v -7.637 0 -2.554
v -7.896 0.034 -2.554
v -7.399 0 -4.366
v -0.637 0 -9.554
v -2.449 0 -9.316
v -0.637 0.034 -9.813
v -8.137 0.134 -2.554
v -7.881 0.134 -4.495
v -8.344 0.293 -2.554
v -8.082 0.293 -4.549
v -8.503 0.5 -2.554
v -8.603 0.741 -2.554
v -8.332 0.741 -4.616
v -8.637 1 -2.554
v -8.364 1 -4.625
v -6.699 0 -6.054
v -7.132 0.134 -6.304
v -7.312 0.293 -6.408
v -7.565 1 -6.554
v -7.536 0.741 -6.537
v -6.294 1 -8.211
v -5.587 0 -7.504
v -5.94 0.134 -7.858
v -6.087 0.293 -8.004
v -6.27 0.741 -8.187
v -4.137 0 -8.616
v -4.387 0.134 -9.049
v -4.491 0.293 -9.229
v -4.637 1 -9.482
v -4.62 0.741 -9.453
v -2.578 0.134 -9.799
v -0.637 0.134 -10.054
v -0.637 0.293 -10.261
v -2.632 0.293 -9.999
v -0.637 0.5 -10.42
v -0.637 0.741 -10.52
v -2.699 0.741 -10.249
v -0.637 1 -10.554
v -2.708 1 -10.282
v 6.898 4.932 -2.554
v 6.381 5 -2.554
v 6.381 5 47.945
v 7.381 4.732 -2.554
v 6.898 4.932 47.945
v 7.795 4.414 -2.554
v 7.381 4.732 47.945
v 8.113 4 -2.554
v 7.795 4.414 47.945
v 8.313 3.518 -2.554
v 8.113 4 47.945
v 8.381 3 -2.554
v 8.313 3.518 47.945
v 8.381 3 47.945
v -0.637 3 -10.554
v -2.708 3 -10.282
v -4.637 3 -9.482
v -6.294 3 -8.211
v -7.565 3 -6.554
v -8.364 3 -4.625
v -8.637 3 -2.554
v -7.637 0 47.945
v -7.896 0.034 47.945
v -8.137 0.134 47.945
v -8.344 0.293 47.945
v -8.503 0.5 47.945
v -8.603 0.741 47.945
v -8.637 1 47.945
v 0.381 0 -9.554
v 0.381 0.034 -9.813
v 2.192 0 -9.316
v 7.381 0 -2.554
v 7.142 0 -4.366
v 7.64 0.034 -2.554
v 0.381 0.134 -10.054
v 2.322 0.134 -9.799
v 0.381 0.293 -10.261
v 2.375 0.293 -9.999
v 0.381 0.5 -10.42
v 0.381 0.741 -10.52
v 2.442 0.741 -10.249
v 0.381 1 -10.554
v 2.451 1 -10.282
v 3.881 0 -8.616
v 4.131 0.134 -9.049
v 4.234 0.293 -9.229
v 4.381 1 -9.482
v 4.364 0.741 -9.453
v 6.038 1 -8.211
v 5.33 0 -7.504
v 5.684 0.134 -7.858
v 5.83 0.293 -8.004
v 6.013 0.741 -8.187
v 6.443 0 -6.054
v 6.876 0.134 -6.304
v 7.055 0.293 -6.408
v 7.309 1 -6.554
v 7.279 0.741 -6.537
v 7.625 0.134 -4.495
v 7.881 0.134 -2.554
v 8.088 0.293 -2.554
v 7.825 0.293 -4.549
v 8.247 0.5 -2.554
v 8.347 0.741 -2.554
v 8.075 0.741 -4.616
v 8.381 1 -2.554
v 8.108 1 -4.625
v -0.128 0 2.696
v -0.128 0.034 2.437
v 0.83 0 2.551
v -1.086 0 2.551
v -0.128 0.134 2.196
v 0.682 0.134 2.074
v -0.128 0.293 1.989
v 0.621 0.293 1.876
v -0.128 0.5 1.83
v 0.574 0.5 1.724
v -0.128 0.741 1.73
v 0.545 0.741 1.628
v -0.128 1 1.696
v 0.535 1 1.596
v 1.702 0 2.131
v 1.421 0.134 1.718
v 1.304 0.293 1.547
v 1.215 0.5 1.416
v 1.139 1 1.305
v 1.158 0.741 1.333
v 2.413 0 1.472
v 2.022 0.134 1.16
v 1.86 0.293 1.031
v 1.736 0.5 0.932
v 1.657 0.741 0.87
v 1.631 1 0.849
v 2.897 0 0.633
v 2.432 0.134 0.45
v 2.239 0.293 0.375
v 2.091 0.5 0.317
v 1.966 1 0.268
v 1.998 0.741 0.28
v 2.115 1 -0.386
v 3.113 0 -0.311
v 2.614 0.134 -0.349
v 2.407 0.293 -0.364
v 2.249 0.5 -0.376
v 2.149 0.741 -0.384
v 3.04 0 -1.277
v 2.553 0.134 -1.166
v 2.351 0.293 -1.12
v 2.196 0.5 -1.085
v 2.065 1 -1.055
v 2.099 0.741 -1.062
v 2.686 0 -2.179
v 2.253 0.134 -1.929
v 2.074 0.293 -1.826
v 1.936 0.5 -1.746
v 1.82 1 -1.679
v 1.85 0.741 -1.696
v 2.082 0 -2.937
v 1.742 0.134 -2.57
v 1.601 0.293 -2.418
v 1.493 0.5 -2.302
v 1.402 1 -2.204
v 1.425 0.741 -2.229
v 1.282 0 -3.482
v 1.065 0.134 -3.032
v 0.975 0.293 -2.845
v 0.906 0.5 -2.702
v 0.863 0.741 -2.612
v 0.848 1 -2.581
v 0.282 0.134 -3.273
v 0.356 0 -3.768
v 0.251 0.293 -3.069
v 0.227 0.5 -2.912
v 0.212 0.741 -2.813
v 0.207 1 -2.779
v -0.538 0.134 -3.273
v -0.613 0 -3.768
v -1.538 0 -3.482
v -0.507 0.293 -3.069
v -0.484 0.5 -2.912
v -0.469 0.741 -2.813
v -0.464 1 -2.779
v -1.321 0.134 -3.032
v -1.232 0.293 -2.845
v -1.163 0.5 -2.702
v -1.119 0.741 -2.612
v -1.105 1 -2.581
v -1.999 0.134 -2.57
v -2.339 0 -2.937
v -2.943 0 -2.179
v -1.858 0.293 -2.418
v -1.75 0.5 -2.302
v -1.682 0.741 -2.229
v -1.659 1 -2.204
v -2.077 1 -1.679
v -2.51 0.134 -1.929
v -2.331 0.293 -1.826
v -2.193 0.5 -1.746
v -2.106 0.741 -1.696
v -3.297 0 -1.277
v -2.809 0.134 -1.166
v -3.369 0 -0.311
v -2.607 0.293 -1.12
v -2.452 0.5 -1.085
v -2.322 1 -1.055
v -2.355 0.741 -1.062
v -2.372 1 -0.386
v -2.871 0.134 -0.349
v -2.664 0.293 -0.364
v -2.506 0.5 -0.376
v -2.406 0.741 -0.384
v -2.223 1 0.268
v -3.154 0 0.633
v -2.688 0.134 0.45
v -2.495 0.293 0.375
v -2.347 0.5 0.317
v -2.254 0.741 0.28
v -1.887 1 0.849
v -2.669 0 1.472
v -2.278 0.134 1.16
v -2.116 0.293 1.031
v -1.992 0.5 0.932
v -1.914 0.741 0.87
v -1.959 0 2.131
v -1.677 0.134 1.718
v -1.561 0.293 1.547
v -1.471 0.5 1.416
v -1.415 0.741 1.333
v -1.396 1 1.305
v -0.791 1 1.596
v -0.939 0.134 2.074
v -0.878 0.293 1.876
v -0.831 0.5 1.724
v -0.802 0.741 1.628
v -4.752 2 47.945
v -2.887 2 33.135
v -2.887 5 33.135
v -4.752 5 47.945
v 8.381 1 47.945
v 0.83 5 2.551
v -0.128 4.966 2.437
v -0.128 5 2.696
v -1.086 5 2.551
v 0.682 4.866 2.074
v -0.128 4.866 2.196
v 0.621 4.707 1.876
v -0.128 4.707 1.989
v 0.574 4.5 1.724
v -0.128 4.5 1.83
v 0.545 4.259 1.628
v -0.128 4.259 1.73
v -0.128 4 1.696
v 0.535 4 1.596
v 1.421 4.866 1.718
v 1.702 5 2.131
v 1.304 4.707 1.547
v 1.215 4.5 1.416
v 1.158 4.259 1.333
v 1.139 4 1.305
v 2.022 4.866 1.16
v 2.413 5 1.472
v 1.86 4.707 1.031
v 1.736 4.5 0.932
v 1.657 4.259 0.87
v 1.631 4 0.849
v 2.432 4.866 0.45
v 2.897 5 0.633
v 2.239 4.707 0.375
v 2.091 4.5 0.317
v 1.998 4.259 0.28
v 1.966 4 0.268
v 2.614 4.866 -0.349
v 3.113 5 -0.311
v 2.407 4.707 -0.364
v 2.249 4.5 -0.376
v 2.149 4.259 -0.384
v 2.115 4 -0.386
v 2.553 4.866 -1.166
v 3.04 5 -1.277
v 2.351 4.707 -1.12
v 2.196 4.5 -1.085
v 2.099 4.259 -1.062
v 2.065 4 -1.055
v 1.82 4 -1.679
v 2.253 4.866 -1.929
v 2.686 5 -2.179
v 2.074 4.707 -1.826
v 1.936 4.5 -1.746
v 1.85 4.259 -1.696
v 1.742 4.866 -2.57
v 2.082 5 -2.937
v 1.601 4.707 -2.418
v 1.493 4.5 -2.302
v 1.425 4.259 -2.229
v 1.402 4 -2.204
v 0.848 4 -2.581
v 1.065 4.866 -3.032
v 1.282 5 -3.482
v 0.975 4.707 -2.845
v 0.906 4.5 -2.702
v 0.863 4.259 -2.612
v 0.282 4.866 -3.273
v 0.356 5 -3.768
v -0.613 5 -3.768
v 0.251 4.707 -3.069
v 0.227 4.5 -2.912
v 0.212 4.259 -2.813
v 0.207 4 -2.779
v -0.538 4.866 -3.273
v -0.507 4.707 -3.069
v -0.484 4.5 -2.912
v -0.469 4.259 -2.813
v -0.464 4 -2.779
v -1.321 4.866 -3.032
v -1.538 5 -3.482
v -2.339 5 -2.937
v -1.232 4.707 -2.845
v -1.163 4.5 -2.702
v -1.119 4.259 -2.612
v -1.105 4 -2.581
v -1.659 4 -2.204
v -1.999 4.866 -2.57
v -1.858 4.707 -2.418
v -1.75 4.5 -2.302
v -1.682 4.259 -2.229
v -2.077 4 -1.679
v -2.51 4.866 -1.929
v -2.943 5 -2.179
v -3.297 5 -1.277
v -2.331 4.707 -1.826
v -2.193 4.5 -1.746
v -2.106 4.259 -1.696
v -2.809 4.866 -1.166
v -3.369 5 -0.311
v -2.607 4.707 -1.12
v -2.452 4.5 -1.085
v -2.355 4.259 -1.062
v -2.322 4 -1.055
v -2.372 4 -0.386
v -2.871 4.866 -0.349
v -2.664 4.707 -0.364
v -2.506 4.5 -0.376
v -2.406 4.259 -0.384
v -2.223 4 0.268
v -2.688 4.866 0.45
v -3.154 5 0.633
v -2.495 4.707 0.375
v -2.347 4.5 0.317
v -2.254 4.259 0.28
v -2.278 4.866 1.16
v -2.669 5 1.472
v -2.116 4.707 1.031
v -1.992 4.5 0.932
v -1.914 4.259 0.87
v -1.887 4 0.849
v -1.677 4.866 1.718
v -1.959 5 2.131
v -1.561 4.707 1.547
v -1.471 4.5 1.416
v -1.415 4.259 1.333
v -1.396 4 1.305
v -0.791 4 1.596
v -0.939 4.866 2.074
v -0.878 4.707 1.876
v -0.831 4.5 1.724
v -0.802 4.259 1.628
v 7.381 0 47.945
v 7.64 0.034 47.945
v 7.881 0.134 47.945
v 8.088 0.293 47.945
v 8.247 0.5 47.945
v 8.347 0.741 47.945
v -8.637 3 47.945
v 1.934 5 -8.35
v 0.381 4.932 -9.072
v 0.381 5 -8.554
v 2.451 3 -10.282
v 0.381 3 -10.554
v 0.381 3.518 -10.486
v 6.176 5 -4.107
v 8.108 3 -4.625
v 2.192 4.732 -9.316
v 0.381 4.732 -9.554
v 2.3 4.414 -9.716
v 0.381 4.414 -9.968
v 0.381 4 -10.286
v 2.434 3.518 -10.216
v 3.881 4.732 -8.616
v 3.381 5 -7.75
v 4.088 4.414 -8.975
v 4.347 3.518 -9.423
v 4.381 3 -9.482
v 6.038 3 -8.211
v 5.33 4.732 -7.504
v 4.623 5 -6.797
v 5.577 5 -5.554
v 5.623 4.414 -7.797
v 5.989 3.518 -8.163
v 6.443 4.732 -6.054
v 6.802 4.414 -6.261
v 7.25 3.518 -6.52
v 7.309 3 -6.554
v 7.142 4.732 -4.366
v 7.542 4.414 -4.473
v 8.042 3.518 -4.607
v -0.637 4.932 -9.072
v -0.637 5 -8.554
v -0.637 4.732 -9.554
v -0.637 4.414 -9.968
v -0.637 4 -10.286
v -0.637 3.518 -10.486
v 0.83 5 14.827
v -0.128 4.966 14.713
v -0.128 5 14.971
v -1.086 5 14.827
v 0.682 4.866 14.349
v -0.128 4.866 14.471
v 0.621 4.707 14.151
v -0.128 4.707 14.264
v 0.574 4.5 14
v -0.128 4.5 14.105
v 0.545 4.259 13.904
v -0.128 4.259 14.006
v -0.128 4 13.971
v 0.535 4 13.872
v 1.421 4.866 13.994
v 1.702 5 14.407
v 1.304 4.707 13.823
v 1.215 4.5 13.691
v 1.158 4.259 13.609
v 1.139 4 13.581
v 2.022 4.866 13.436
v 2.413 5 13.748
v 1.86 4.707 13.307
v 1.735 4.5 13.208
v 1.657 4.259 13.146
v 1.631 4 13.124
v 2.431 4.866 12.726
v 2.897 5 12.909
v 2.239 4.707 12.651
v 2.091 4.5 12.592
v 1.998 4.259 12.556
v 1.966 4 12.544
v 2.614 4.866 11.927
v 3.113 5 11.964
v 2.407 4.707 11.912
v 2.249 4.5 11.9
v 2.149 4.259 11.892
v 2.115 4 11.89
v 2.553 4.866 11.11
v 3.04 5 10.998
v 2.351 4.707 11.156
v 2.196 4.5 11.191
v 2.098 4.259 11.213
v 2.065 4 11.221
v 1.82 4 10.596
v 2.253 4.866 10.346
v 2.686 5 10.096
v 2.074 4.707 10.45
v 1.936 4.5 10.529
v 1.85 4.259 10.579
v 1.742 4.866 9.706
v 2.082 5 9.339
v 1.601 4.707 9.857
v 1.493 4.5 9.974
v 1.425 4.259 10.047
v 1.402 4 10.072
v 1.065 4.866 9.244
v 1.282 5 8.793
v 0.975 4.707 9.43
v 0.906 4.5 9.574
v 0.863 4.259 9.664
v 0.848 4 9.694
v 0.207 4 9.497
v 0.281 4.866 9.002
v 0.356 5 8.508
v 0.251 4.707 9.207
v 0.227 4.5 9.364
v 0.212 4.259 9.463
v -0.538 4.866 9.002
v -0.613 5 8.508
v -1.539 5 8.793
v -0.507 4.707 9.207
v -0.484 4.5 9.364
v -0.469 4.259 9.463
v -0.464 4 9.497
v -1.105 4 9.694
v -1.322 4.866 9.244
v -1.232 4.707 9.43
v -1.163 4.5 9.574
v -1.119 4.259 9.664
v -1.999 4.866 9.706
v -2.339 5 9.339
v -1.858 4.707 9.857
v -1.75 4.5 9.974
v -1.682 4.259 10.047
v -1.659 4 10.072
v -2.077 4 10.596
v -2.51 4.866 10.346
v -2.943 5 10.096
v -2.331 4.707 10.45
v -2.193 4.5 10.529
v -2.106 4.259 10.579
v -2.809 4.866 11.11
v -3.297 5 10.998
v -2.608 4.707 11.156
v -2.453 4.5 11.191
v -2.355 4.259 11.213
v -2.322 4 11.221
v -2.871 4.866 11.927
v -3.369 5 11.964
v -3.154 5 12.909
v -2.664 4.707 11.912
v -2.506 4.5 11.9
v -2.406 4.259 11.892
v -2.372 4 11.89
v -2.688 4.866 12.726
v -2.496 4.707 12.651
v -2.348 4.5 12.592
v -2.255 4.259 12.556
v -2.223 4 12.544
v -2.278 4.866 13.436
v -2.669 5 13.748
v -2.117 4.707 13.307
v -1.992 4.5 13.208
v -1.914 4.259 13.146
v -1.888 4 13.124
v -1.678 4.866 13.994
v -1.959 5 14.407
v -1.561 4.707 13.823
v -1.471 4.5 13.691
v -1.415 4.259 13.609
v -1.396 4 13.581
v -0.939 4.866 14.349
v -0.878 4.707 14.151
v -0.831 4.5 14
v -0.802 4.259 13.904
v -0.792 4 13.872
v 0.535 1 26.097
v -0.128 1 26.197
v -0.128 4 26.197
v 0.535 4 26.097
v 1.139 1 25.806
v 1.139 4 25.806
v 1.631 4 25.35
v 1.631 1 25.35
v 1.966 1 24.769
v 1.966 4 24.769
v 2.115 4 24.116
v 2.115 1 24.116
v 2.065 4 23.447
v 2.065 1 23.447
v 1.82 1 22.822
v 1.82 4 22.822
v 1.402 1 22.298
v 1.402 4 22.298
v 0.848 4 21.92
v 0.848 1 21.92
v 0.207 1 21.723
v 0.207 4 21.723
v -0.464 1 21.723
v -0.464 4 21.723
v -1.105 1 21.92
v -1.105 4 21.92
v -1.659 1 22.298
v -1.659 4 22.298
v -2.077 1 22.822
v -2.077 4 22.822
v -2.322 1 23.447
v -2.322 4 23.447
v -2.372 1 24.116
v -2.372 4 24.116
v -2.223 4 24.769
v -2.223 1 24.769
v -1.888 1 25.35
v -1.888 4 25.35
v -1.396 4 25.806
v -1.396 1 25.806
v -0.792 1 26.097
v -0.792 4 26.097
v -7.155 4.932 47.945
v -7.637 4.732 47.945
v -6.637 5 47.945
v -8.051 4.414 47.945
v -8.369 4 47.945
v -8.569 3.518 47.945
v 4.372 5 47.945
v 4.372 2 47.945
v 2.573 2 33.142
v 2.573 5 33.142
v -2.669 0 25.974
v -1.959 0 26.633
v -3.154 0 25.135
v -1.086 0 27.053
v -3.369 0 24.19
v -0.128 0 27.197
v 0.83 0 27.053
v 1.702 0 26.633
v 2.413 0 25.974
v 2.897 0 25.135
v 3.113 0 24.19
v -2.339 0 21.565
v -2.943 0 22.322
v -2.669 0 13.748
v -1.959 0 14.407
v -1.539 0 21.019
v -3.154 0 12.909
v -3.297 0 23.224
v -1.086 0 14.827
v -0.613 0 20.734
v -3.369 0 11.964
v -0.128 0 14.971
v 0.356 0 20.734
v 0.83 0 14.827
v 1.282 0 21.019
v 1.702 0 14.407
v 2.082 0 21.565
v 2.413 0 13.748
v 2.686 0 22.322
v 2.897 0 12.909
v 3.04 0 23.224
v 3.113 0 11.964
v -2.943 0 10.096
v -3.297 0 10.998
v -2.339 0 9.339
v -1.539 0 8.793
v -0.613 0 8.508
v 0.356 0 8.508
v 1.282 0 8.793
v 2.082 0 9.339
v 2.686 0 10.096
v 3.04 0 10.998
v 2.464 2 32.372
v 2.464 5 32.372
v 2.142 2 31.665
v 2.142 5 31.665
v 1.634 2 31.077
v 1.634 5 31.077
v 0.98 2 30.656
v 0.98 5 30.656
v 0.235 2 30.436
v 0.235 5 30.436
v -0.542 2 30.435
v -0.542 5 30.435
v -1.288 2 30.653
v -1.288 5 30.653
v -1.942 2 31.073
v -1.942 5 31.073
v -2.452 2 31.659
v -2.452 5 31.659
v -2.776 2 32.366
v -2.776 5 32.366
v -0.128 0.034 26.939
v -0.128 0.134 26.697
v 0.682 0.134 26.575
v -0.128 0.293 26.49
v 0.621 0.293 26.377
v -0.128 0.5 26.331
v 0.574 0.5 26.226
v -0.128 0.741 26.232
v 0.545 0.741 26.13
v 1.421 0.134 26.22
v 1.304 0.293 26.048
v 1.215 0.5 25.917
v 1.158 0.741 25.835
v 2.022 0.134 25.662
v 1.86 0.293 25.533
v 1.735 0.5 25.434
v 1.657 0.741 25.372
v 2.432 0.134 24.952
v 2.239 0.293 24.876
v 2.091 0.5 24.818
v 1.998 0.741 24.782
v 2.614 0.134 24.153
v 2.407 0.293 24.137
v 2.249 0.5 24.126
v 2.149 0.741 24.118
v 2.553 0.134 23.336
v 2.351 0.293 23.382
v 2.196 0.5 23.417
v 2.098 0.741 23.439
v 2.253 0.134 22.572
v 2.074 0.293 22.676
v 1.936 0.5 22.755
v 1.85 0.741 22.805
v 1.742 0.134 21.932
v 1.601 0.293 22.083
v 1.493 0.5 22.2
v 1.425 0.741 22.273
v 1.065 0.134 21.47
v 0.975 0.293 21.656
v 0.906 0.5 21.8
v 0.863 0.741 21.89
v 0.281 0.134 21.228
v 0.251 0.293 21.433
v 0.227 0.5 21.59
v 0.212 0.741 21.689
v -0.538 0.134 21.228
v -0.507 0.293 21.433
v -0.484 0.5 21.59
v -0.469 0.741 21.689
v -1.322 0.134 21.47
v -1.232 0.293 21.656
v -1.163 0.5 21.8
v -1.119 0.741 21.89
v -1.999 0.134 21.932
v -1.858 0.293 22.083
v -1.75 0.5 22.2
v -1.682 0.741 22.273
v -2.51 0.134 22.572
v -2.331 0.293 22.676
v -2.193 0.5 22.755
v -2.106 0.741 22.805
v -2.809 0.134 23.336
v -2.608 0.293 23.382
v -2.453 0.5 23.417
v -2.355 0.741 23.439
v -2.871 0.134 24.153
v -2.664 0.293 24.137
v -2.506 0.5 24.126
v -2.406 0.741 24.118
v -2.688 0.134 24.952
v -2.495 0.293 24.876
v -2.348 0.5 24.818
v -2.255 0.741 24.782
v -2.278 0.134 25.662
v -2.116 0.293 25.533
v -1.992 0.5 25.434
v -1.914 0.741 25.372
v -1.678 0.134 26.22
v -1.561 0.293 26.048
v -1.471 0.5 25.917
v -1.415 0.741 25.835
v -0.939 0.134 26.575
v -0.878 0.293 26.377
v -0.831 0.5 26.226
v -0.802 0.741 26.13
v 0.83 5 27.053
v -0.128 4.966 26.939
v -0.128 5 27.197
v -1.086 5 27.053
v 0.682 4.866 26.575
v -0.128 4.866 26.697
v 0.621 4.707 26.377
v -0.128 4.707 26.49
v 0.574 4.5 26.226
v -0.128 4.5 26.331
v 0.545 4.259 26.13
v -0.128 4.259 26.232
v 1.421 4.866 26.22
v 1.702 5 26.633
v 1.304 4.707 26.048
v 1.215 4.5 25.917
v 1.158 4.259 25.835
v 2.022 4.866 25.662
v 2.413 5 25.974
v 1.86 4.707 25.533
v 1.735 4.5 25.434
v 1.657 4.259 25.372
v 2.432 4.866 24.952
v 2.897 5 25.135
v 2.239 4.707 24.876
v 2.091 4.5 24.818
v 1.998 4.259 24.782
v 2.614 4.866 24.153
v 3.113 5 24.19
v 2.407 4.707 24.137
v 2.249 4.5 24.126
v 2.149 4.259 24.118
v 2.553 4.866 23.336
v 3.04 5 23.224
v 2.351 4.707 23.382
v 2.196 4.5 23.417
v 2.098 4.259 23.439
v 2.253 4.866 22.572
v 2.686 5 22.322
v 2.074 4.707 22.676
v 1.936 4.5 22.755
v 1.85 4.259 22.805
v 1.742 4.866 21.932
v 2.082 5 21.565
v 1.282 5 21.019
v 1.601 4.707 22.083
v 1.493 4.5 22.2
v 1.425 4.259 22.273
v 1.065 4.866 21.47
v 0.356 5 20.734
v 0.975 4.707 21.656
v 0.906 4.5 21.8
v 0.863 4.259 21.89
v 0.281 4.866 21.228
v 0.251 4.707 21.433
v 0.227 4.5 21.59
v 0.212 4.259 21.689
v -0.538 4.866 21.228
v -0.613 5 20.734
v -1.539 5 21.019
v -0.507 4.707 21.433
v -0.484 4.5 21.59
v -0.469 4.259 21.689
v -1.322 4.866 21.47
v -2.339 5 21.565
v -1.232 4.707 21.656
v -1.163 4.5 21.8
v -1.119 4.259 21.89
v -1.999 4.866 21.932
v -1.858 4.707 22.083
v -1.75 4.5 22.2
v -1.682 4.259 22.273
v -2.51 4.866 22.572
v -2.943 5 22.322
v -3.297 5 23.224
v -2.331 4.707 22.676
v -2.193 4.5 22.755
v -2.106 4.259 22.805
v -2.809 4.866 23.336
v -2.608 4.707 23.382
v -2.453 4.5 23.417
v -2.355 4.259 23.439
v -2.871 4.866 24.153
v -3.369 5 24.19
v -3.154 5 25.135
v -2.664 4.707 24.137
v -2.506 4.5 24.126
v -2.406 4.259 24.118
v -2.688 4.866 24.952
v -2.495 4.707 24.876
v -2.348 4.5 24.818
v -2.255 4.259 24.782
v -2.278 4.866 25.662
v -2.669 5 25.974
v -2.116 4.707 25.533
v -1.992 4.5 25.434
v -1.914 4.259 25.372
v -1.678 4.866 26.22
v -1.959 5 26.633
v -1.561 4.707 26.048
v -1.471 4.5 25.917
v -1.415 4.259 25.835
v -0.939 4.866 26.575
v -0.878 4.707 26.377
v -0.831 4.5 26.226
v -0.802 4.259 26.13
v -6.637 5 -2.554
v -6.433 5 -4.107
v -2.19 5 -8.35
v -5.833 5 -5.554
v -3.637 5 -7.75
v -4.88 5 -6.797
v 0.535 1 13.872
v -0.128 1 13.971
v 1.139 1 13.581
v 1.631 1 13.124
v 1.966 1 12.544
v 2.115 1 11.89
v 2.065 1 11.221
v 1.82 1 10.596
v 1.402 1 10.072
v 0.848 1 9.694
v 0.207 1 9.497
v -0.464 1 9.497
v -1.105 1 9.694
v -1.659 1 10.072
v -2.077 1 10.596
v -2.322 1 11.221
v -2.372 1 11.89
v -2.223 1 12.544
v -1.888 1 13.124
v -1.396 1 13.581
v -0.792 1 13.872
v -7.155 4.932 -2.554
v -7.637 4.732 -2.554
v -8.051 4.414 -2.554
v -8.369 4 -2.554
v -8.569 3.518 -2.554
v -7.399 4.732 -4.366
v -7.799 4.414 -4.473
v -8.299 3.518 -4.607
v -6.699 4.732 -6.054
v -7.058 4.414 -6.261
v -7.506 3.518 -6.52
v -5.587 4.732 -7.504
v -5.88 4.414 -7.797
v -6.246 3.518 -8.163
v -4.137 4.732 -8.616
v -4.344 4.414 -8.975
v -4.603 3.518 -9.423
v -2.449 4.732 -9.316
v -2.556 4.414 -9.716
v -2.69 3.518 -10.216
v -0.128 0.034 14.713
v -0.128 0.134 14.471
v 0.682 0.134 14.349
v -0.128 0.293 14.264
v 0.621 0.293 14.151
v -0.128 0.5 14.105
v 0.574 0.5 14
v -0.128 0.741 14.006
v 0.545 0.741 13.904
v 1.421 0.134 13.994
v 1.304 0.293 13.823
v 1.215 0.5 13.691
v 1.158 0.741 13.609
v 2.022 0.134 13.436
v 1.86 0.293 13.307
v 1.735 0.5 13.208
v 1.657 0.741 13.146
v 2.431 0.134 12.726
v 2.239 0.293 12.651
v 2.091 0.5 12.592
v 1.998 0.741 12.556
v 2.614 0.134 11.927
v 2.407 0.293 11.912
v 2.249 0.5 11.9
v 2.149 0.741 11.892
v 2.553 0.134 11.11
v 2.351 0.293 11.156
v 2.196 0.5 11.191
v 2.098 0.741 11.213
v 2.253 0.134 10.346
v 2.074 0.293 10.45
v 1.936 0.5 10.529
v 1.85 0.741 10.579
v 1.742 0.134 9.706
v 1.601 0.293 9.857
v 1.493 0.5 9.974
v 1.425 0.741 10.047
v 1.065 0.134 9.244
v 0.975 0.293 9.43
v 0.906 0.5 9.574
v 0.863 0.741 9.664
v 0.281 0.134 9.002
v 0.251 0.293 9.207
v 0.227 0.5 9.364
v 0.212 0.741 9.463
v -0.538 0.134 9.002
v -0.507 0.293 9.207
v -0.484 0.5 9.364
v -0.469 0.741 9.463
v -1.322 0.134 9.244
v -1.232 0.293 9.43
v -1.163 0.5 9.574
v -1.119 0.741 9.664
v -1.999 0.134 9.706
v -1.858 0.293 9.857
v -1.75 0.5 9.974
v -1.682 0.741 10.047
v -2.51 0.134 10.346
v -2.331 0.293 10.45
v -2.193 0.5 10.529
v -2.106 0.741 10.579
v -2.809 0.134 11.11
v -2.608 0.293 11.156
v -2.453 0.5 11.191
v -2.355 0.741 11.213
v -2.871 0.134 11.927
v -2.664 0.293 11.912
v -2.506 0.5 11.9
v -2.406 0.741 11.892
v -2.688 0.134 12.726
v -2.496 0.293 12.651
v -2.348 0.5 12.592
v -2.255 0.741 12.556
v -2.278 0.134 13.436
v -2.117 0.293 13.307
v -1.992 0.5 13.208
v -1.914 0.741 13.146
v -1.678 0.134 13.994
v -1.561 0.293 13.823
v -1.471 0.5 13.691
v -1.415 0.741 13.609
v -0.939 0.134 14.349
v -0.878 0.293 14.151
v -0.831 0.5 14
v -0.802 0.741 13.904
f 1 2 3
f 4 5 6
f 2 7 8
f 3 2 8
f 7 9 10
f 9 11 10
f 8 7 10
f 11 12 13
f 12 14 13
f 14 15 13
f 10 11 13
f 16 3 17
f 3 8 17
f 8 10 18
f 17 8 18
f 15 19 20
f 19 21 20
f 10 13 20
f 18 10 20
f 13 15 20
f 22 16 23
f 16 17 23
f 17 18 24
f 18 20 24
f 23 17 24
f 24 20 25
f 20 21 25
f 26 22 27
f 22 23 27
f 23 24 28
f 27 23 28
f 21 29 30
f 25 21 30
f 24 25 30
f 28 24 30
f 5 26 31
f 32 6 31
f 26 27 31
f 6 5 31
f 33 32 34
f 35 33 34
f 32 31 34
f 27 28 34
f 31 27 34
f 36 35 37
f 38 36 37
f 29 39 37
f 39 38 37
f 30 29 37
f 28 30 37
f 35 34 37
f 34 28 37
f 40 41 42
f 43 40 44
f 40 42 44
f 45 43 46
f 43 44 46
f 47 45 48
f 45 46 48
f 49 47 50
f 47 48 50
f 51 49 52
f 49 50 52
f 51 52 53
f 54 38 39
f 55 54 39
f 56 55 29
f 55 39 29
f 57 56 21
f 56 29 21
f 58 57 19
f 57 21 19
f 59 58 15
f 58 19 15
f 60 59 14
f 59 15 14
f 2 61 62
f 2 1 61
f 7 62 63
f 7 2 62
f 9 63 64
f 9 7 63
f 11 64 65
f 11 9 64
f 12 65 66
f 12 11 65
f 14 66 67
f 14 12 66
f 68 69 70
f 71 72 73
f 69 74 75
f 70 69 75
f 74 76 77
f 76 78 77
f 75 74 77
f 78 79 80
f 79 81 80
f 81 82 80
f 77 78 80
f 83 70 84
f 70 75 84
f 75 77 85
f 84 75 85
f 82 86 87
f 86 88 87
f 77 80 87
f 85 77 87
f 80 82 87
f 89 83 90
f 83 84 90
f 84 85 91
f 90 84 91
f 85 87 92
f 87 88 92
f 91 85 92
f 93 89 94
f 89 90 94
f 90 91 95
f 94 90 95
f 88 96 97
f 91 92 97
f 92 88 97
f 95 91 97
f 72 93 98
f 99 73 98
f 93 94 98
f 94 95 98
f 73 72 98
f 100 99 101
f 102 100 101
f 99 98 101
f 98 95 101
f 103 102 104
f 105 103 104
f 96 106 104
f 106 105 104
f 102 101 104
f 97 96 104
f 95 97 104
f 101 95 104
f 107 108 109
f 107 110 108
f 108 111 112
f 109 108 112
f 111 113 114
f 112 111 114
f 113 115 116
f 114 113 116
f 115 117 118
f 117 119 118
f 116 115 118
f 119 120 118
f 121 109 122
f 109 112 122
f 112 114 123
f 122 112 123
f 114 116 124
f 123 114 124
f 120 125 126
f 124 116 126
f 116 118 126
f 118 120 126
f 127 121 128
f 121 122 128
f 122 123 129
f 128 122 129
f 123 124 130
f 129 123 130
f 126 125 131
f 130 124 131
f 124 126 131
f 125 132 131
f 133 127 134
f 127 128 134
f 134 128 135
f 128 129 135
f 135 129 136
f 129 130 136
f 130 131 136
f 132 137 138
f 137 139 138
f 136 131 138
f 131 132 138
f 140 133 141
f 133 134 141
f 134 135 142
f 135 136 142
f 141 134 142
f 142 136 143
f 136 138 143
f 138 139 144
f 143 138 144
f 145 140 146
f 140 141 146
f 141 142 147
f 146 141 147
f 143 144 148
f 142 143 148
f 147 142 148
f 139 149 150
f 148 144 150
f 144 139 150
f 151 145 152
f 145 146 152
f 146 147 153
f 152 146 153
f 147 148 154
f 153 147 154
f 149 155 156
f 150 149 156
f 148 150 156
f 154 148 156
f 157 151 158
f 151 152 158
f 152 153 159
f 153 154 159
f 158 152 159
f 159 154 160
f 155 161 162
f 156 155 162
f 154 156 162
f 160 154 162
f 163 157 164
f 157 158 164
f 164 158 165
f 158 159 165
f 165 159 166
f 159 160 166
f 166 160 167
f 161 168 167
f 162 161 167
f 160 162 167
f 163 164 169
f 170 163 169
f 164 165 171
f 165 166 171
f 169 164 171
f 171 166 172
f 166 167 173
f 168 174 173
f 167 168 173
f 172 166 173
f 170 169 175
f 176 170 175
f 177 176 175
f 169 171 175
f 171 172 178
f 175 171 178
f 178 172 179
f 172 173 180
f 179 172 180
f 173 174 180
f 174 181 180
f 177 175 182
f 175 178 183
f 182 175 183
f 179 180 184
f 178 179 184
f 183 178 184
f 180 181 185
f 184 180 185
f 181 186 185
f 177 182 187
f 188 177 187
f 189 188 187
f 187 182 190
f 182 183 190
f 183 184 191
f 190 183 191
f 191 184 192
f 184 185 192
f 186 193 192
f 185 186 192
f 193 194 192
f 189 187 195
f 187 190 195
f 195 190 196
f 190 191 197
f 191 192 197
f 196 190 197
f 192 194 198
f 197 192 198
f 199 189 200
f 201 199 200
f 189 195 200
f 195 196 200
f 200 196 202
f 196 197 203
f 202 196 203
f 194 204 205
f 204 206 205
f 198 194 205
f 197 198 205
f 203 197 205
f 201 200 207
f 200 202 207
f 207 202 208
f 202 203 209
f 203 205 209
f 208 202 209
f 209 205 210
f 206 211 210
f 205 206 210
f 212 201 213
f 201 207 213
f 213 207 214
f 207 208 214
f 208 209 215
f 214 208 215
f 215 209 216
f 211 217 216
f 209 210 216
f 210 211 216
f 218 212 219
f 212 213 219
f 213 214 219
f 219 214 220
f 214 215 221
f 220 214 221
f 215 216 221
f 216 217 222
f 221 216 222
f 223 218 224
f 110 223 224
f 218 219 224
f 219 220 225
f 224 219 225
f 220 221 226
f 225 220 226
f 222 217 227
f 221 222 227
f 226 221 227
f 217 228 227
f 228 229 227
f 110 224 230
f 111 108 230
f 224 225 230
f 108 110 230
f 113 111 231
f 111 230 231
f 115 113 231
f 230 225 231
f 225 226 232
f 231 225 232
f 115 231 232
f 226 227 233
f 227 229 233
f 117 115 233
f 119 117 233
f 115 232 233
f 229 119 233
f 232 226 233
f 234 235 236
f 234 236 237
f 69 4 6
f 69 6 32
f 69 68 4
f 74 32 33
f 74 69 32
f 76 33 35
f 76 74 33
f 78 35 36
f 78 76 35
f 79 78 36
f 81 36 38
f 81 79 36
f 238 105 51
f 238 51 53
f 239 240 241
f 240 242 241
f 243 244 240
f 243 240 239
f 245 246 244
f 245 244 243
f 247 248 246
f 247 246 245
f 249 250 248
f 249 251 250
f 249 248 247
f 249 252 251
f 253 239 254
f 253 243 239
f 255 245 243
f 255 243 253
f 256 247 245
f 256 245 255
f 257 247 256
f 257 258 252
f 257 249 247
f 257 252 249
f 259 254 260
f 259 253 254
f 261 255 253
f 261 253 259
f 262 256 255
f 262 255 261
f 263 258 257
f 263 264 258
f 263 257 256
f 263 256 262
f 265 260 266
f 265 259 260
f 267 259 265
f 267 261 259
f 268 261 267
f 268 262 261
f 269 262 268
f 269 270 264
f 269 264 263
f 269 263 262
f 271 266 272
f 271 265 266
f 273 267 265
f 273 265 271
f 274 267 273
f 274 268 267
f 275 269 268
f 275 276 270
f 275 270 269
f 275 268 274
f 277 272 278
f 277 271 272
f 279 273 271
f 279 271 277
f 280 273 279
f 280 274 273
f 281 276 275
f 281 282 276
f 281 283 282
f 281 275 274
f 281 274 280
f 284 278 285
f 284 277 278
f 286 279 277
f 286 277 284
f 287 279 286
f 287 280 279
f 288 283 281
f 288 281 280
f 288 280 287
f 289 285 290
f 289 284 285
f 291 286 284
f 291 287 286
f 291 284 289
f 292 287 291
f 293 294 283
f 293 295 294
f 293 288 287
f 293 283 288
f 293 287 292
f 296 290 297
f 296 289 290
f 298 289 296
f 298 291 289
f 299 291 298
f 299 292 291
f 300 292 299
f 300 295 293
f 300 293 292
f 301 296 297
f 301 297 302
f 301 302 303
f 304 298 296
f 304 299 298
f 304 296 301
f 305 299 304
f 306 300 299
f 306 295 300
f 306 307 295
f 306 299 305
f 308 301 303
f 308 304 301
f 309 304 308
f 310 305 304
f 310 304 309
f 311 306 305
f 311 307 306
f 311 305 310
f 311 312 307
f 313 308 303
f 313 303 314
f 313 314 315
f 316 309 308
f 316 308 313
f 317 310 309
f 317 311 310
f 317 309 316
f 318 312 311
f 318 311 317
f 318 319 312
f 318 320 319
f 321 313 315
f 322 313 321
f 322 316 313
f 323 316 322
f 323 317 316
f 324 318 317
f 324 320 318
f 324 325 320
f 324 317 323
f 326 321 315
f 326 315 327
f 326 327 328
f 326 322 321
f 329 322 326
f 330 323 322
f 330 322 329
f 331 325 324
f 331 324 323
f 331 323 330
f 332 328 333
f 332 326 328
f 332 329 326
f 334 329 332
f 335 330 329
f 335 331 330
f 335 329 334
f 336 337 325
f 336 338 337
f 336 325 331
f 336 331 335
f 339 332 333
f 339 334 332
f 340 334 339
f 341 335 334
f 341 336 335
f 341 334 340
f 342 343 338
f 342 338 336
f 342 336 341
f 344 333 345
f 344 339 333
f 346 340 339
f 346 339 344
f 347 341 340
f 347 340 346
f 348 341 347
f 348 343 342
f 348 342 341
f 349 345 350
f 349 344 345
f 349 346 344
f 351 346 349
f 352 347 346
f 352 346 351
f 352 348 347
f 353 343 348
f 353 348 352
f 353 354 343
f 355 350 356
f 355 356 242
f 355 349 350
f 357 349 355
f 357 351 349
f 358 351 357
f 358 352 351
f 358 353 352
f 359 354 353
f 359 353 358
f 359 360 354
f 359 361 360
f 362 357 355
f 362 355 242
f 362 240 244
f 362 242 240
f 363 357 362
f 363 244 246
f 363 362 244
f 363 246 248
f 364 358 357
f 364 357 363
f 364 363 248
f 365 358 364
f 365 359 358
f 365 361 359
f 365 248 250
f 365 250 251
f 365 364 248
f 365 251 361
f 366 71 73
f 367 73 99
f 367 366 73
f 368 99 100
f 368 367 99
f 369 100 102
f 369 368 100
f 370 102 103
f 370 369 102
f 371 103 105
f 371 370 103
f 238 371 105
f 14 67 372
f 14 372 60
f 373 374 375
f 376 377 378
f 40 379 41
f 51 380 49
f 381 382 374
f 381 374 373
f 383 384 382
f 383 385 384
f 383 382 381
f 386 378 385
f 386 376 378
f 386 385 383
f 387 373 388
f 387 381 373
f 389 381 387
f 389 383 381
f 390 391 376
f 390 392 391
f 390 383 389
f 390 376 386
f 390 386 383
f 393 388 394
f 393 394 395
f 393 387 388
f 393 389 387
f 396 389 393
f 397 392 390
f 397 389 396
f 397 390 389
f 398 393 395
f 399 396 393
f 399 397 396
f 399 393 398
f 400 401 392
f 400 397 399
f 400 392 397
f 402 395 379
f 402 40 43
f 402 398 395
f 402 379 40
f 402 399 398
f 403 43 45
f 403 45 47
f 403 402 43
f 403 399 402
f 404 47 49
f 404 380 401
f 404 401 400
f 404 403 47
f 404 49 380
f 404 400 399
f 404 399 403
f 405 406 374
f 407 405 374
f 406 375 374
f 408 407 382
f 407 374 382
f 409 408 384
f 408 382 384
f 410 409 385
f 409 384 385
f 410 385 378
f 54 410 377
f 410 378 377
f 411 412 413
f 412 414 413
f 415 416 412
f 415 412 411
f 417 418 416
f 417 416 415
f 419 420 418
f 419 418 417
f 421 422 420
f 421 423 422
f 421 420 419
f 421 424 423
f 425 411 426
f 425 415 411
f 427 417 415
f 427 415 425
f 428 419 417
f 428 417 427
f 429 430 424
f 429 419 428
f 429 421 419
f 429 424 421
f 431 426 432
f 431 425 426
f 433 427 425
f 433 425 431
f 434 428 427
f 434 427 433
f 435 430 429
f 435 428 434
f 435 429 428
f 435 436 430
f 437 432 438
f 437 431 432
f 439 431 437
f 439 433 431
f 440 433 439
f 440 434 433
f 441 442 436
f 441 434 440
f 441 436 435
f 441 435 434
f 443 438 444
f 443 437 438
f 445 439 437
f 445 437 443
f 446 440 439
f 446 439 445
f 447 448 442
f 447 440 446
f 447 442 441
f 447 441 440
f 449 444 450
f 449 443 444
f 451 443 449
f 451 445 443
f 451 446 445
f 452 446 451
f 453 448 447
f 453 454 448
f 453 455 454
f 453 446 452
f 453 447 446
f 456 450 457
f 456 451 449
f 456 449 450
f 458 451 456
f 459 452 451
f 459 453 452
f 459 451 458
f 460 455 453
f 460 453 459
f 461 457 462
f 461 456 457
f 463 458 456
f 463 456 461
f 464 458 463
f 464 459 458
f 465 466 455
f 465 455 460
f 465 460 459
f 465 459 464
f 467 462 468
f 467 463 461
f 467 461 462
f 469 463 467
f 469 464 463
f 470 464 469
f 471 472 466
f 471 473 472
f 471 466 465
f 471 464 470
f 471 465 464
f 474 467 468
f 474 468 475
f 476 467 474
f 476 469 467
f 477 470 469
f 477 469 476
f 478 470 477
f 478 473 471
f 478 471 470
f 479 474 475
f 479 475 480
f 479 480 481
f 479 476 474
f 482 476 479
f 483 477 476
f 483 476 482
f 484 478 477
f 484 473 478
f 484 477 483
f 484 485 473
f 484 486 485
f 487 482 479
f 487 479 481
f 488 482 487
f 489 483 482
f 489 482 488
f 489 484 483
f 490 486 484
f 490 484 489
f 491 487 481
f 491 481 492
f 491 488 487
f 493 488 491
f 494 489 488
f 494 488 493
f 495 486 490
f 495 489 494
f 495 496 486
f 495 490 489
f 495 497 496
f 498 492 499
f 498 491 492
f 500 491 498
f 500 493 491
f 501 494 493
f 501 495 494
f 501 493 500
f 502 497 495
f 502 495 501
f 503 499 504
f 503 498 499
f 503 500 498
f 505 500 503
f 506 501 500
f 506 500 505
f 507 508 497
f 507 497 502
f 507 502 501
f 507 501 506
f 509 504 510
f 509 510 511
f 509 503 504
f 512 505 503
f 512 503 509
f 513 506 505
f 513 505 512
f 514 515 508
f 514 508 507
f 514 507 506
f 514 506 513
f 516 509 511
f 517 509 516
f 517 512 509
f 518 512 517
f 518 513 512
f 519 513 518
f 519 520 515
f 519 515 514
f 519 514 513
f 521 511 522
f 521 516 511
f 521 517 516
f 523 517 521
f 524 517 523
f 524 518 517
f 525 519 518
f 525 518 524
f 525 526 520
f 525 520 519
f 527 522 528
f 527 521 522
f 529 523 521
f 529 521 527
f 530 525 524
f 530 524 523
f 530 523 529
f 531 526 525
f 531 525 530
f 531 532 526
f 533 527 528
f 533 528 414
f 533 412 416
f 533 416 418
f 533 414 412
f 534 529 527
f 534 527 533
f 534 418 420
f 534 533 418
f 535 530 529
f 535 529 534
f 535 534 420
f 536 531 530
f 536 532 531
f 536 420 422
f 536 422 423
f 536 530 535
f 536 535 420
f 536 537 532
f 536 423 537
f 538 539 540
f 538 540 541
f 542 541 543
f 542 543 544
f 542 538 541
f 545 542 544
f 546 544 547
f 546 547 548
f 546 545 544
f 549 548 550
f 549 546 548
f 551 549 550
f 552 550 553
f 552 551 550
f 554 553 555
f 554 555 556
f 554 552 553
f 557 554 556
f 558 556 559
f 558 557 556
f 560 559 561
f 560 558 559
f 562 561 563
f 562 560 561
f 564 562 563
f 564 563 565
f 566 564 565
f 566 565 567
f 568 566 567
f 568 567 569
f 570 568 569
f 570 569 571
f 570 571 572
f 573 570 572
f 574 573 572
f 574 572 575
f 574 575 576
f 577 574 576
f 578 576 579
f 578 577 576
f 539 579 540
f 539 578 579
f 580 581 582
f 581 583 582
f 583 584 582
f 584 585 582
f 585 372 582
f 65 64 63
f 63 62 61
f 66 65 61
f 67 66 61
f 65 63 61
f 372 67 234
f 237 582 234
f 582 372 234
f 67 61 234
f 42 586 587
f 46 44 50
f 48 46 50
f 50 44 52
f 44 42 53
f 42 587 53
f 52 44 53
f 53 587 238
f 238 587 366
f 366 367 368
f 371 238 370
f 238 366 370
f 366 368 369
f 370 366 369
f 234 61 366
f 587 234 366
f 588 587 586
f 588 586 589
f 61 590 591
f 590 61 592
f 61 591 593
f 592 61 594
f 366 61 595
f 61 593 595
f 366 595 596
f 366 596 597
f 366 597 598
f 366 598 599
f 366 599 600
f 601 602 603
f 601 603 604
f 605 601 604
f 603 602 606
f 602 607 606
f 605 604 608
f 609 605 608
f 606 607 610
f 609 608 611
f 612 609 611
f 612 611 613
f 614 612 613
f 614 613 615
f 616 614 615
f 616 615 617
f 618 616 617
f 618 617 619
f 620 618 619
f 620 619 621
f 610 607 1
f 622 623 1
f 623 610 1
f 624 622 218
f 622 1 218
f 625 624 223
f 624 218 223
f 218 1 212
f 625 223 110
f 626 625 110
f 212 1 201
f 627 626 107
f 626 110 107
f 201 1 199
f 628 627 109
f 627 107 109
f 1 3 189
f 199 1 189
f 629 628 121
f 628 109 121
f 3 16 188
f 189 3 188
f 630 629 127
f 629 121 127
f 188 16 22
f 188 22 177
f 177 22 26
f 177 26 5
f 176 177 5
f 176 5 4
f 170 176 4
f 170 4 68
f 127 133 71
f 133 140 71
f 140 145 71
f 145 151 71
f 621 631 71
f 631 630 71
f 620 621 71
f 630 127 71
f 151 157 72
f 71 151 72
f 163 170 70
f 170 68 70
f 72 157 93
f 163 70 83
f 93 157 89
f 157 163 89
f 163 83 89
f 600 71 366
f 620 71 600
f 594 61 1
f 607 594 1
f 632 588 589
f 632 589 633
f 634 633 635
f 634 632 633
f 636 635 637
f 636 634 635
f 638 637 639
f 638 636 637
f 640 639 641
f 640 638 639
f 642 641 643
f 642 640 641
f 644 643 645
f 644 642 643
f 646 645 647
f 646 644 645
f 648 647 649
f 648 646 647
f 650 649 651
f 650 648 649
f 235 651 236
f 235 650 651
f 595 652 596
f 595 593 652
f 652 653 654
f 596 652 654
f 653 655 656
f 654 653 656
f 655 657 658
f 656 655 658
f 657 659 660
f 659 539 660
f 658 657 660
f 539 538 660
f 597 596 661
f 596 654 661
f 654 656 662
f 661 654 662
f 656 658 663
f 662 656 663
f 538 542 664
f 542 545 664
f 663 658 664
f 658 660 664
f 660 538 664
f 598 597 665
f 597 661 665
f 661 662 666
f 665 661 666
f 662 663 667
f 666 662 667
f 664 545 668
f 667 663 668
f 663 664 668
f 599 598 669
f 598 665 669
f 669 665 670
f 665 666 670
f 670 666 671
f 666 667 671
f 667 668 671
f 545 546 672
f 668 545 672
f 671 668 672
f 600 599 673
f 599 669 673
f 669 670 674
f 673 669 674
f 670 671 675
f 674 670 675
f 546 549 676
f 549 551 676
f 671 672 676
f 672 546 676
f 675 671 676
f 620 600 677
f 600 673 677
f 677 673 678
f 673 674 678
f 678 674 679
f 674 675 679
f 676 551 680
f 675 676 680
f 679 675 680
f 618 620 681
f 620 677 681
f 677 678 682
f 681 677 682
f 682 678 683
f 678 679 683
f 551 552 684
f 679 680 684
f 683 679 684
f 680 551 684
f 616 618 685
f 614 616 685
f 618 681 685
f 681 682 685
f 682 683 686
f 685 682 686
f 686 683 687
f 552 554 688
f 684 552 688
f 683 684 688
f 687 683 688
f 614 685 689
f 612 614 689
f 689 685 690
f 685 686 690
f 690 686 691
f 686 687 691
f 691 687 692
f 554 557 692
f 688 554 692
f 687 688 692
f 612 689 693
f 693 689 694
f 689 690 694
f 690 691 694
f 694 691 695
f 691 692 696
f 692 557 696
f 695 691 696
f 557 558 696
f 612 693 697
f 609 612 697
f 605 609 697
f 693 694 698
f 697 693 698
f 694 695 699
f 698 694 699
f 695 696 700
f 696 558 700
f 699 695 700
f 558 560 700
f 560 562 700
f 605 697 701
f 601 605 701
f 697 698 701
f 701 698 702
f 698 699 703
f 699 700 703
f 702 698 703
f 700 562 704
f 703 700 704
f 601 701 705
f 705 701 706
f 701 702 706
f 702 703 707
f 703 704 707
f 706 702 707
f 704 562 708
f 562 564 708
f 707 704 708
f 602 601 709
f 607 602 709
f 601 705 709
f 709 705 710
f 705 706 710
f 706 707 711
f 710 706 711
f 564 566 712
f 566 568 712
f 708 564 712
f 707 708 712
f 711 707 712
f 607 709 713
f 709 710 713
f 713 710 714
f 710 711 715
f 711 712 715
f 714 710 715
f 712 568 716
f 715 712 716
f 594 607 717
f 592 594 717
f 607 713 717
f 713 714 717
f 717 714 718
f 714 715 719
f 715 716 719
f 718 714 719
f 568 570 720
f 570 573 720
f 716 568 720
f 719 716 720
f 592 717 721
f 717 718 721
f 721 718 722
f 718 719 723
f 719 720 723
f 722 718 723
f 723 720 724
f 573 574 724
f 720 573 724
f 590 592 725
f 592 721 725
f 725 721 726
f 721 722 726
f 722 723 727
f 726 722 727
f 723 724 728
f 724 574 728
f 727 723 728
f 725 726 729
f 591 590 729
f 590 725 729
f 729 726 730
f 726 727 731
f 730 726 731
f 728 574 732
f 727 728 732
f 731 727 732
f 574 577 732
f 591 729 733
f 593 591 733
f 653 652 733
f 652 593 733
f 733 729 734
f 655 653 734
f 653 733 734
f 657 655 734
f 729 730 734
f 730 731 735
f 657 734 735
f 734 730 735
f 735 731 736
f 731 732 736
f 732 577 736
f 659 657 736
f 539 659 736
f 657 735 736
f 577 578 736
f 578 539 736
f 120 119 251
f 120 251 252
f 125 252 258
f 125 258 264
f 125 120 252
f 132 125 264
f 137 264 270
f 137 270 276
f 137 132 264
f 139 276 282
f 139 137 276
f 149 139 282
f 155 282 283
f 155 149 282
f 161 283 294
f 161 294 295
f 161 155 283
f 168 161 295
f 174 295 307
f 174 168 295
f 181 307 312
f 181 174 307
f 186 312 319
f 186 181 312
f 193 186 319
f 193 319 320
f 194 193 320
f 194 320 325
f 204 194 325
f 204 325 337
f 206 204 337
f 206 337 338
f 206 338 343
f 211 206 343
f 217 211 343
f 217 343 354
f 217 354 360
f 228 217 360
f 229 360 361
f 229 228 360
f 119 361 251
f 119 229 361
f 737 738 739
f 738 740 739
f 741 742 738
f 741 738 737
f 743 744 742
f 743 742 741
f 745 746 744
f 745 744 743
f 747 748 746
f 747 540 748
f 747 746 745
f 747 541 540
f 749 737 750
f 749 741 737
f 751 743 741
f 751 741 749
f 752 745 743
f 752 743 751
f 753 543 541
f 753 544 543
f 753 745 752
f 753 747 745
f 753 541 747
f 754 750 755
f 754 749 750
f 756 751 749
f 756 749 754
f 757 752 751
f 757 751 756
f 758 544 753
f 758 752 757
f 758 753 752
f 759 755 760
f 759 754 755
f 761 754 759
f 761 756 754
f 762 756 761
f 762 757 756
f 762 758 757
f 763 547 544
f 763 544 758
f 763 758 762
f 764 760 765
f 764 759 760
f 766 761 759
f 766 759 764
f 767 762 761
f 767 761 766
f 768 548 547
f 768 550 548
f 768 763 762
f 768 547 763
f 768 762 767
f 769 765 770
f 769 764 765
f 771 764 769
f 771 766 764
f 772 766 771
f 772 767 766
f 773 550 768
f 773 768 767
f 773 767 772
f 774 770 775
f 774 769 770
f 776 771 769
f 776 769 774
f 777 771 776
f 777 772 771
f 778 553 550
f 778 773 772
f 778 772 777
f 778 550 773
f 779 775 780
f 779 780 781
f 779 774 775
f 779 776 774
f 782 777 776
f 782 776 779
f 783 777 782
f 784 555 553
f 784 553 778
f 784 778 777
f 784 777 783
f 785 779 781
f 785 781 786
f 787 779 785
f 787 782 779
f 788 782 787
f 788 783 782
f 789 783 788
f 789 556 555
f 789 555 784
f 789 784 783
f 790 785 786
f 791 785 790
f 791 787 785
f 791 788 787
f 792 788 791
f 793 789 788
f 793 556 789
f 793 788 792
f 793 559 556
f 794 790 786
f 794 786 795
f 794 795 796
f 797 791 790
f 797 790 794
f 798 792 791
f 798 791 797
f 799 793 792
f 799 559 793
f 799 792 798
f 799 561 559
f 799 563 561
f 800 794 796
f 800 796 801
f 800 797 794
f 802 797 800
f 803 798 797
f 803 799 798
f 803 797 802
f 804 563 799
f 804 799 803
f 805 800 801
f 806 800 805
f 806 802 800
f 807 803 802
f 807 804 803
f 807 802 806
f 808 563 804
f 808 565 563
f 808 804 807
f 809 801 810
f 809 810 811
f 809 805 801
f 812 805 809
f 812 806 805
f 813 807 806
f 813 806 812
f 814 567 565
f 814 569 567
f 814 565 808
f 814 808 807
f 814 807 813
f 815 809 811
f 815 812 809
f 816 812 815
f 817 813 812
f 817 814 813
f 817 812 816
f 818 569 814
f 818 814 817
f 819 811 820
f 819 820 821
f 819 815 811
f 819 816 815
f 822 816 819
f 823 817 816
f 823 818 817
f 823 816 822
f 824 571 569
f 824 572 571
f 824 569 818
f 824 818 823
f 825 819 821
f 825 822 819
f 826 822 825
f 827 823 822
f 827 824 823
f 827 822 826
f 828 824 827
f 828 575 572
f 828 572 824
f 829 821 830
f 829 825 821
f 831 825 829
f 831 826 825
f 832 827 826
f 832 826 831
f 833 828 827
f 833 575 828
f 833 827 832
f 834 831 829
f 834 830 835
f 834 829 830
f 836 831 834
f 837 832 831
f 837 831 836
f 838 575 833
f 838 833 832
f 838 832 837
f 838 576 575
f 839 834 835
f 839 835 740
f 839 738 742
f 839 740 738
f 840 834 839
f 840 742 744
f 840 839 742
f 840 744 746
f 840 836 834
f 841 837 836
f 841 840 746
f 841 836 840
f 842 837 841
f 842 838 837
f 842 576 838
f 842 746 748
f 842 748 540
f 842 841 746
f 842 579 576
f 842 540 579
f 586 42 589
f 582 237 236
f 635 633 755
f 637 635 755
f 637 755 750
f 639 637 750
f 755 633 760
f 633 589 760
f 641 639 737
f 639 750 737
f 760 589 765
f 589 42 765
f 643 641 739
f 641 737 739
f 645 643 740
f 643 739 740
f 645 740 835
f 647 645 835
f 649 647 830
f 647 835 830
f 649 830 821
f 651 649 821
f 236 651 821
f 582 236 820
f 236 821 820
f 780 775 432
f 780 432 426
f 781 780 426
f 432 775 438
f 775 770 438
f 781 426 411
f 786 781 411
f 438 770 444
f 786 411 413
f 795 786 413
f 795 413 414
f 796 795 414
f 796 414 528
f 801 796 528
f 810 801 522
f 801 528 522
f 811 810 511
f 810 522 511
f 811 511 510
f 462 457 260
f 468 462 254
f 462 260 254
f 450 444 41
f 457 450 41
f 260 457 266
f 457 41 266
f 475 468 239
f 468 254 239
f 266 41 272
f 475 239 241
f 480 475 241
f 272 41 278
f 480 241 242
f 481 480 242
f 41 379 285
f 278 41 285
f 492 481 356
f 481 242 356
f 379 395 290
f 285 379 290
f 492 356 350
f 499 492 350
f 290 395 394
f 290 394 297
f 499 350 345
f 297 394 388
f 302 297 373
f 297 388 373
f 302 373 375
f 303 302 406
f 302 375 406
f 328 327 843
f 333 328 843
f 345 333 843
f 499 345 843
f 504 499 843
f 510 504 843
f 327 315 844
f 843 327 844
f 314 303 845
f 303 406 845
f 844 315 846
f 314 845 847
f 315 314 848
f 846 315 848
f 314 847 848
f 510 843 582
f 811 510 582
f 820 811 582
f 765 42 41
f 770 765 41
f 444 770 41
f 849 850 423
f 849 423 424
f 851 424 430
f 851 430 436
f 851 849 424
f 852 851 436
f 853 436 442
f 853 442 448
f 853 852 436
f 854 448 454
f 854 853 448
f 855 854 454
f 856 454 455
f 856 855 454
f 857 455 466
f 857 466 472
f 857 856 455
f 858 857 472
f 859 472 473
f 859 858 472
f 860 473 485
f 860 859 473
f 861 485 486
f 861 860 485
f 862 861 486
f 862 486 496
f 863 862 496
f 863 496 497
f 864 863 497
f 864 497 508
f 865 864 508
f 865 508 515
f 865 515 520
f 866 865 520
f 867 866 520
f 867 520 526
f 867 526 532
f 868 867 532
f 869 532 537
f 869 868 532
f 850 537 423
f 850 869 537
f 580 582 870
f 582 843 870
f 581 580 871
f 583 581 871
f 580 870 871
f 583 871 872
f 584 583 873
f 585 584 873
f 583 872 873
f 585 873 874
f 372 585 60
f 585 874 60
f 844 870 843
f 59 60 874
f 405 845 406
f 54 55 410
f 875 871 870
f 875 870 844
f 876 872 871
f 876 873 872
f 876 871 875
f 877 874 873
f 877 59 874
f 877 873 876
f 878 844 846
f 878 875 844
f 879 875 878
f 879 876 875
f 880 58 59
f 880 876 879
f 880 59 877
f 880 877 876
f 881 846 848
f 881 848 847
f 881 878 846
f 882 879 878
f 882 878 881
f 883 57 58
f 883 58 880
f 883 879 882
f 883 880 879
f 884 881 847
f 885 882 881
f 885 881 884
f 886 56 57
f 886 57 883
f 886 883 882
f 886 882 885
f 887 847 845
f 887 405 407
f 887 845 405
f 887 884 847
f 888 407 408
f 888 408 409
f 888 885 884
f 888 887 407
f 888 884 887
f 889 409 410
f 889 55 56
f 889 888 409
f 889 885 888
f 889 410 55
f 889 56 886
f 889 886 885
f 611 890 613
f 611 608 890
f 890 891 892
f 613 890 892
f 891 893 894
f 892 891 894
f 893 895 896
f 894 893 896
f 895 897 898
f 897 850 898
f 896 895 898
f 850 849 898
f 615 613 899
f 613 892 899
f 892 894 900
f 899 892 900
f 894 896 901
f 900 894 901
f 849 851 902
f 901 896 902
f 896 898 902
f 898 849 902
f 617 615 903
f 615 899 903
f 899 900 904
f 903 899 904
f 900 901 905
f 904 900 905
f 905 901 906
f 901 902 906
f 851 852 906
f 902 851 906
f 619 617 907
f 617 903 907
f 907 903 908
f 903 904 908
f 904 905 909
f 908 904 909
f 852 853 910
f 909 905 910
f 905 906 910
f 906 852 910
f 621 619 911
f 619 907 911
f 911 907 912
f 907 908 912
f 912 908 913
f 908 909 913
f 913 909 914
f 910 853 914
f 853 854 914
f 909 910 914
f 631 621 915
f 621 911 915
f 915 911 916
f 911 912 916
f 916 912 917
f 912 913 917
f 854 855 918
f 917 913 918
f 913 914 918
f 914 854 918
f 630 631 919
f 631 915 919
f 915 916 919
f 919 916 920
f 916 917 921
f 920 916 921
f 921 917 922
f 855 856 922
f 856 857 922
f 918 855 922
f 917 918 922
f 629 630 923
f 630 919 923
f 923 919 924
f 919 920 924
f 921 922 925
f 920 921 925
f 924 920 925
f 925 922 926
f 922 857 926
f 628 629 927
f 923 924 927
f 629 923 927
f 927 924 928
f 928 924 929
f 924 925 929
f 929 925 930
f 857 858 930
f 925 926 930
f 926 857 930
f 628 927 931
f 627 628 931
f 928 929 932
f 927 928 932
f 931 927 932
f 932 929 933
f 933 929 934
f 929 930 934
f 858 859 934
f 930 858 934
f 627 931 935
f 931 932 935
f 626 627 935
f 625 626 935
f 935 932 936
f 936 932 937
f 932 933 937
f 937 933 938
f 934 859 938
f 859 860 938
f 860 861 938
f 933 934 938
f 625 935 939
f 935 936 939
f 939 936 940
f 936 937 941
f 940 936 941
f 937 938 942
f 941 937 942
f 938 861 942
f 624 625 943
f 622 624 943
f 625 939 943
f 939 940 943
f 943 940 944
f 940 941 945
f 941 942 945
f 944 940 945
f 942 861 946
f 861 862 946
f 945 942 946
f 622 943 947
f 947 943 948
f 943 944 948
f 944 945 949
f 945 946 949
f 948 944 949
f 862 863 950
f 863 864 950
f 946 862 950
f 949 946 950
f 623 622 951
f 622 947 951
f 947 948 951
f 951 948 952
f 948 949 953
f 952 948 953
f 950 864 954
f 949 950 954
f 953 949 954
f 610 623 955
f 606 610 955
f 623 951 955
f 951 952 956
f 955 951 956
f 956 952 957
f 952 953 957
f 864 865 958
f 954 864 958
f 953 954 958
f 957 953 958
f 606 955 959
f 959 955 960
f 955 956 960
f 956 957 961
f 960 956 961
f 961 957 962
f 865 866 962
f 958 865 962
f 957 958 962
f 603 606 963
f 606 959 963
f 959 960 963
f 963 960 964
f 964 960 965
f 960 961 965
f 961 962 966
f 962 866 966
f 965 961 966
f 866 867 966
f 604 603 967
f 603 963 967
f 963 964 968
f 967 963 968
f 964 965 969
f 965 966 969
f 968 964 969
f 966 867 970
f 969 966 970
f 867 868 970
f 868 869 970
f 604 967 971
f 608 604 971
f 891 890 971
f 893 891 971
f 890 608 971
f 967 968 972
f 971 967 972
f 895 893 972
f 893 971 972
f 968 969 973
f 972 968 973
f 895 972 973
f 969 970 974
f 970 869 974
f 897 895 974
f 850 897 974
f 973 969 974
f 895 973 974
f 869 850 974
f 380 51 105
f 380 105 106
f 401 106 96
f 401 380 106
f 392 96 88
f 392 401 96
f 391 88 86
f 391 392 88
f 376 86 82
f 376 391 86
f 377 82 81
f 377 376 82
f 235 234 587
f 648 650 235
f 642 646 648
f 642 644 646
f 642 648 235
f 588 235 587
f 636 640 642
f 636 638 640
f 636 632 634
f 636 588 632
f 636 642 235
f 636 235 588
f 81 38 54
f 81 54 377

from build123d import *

# Parameters (mm, degrees)
SKETCH2_W           = 17.01772998
SKETCH2_H           = 58.499243576
SKETCH2_R           = 2.25
SKETCH2_R_2         = 2.249999999
BOSS_EXTRUDE1_DEPTH = 2
SKETCH2_7_R         = 2.25
SKETCH2_7_R_2       = 2.249999999
BOSS_EXTRUDE2_DEPTH = 5
FILLET1_R           = 8
FILLET2_R           = 2
FILLET3_R           = 1
FILLET4_R           = 1


with BuildPart() as part:
    # Sketch2 → Boss-Extrude1 (new body)
    with BuildSketch(Plane(origin=(0, 0, 0), x_dir=(1, 0, 0), z_dir=(0, 1, 0))):
        with Locations((-0.128175668, -18.695407456)):
            Rectangle(SKETCH2_W, SKETCH2_H)
        with Locations((-0.12838313, -23.94744701)):
            Circle(SKETCH2_R, mode=Mode.SUBTRACT)
        with Locations((-0.128409056, -11.721483427)):
            Circle(SKETCH2_R_2, mode=Mode.SUBTRACT)
        with Locations((-0.128292362, 0.554214332)):
            Circle(SKETCH2_R, mode=Mode.SUBTRACT)
    extrude(amount=BOSS_EXTRUDE1_DEPTH)

    # Sketch2<7> → Boss-Extrude2 (add)
    with BuildSketch(Plane(origin=(0, 0, 0), x_dir=(1, 0, 0), z_dir=(0, 1, 0))):
        with BuildLine():
            Line((-4.751975313, -47.945029244), (-2.88708064, -33.13501383))
            ThreePointArc((-2.88708064, -33.13501383), (-0.153440685, -30.408093493), (2.573479652, -33.141733448))
            Line((2.573479652, -33.141733448), (4.372168697, -47.945029244))
            Line((4.372168697, -47.945029244), (8.380689322, -47.945029244))
            Line((8.380689322, -47.945029244), (8.380689322, 10.554214332))
            Line((8.380689322, 10.554214332), (-0.128409056, 10.554214332))
            Line((-0.128409056, 10.554214332), (-8.637040658, 10.554214332))
            Line((-8.637040658, 10.554214332), (-8.637040658, -47.945029244))
            Line((-8.637040658, -47.945029244), (-4.751975313, -47.945029244))
        make_face()
        with Locations((-0.12838313, -23.94744701)):
            Circle(SKETCH2_7_R, mode=Mode.SUBTRACT)
        with Locations((-0.128409056, -11.721483427)):
            Circle(SKETCH2_7_R_2, mode=Mode.SUBTRACT)
        with Locations((-0.128292362, 0.554214332)):
            Circle(SKETCH2_7_R, mode=Mode.SUBTRACT)
    extrude(amount=BOSS_EXTRUDE2_DEPTH)

    # Fillet1
    fillet1_edges = [part.edges().sort_by_distance(p)[0] for p in [
        (-8.637040658, 2.5, -10.554214332),
        (8.380689322, 2.5, -10.554214332),
    ]]
    fillet(fillet1_edges, radius=FILLET1_R)

    # Fillet2
    fillet2_edges = [part.edges().sort_by_distance(p)[0] for p in [
        (8.380689322, 5, 22.695407456),
        (6.037543572, 5, -8.211068582),
        (-0.128175668, 5, -10.554214332),
        (-6.293894907, 5, -8.211068582),
        (-8.637040658, 5, 22.695407456),
    ]]
    fillet(fillet2_edges, radius=FILLET2_R)

    # Fillet3
    fillet3_edges = [part.edges().sort_by_distance(p)[0] for p in [
        (-2.37838313, 0, 23.94744701),
        (-2.378409055, 0, 11.721483427),
        (-2.378292362, 0, -0.554214332),
        (-2.378292362, 5, -0.554214332),
        (-2.378409055, 5, 11.721483427),
        (-2.37838313, 5, 23.94744701),
    ]]
    fillet(fillet3_edges, radius=FILLET3_R)

    # Fillet4
    fillet4_edges = [part.edges().sort_by_distance(p)[0] for p in [
        (-8.637040658, 0, 22.695407456),
        (-6.293894907, 0, -8.211068582),
        (-0.128175668, 0, -10.554214332),
        (6.037543572, 0, -8.211068582),
        (8.380689322, 0, 22.695407456),
    ]]
    fillet(fillet4_edges, radius=FILLET4_R)


solid = part.part
